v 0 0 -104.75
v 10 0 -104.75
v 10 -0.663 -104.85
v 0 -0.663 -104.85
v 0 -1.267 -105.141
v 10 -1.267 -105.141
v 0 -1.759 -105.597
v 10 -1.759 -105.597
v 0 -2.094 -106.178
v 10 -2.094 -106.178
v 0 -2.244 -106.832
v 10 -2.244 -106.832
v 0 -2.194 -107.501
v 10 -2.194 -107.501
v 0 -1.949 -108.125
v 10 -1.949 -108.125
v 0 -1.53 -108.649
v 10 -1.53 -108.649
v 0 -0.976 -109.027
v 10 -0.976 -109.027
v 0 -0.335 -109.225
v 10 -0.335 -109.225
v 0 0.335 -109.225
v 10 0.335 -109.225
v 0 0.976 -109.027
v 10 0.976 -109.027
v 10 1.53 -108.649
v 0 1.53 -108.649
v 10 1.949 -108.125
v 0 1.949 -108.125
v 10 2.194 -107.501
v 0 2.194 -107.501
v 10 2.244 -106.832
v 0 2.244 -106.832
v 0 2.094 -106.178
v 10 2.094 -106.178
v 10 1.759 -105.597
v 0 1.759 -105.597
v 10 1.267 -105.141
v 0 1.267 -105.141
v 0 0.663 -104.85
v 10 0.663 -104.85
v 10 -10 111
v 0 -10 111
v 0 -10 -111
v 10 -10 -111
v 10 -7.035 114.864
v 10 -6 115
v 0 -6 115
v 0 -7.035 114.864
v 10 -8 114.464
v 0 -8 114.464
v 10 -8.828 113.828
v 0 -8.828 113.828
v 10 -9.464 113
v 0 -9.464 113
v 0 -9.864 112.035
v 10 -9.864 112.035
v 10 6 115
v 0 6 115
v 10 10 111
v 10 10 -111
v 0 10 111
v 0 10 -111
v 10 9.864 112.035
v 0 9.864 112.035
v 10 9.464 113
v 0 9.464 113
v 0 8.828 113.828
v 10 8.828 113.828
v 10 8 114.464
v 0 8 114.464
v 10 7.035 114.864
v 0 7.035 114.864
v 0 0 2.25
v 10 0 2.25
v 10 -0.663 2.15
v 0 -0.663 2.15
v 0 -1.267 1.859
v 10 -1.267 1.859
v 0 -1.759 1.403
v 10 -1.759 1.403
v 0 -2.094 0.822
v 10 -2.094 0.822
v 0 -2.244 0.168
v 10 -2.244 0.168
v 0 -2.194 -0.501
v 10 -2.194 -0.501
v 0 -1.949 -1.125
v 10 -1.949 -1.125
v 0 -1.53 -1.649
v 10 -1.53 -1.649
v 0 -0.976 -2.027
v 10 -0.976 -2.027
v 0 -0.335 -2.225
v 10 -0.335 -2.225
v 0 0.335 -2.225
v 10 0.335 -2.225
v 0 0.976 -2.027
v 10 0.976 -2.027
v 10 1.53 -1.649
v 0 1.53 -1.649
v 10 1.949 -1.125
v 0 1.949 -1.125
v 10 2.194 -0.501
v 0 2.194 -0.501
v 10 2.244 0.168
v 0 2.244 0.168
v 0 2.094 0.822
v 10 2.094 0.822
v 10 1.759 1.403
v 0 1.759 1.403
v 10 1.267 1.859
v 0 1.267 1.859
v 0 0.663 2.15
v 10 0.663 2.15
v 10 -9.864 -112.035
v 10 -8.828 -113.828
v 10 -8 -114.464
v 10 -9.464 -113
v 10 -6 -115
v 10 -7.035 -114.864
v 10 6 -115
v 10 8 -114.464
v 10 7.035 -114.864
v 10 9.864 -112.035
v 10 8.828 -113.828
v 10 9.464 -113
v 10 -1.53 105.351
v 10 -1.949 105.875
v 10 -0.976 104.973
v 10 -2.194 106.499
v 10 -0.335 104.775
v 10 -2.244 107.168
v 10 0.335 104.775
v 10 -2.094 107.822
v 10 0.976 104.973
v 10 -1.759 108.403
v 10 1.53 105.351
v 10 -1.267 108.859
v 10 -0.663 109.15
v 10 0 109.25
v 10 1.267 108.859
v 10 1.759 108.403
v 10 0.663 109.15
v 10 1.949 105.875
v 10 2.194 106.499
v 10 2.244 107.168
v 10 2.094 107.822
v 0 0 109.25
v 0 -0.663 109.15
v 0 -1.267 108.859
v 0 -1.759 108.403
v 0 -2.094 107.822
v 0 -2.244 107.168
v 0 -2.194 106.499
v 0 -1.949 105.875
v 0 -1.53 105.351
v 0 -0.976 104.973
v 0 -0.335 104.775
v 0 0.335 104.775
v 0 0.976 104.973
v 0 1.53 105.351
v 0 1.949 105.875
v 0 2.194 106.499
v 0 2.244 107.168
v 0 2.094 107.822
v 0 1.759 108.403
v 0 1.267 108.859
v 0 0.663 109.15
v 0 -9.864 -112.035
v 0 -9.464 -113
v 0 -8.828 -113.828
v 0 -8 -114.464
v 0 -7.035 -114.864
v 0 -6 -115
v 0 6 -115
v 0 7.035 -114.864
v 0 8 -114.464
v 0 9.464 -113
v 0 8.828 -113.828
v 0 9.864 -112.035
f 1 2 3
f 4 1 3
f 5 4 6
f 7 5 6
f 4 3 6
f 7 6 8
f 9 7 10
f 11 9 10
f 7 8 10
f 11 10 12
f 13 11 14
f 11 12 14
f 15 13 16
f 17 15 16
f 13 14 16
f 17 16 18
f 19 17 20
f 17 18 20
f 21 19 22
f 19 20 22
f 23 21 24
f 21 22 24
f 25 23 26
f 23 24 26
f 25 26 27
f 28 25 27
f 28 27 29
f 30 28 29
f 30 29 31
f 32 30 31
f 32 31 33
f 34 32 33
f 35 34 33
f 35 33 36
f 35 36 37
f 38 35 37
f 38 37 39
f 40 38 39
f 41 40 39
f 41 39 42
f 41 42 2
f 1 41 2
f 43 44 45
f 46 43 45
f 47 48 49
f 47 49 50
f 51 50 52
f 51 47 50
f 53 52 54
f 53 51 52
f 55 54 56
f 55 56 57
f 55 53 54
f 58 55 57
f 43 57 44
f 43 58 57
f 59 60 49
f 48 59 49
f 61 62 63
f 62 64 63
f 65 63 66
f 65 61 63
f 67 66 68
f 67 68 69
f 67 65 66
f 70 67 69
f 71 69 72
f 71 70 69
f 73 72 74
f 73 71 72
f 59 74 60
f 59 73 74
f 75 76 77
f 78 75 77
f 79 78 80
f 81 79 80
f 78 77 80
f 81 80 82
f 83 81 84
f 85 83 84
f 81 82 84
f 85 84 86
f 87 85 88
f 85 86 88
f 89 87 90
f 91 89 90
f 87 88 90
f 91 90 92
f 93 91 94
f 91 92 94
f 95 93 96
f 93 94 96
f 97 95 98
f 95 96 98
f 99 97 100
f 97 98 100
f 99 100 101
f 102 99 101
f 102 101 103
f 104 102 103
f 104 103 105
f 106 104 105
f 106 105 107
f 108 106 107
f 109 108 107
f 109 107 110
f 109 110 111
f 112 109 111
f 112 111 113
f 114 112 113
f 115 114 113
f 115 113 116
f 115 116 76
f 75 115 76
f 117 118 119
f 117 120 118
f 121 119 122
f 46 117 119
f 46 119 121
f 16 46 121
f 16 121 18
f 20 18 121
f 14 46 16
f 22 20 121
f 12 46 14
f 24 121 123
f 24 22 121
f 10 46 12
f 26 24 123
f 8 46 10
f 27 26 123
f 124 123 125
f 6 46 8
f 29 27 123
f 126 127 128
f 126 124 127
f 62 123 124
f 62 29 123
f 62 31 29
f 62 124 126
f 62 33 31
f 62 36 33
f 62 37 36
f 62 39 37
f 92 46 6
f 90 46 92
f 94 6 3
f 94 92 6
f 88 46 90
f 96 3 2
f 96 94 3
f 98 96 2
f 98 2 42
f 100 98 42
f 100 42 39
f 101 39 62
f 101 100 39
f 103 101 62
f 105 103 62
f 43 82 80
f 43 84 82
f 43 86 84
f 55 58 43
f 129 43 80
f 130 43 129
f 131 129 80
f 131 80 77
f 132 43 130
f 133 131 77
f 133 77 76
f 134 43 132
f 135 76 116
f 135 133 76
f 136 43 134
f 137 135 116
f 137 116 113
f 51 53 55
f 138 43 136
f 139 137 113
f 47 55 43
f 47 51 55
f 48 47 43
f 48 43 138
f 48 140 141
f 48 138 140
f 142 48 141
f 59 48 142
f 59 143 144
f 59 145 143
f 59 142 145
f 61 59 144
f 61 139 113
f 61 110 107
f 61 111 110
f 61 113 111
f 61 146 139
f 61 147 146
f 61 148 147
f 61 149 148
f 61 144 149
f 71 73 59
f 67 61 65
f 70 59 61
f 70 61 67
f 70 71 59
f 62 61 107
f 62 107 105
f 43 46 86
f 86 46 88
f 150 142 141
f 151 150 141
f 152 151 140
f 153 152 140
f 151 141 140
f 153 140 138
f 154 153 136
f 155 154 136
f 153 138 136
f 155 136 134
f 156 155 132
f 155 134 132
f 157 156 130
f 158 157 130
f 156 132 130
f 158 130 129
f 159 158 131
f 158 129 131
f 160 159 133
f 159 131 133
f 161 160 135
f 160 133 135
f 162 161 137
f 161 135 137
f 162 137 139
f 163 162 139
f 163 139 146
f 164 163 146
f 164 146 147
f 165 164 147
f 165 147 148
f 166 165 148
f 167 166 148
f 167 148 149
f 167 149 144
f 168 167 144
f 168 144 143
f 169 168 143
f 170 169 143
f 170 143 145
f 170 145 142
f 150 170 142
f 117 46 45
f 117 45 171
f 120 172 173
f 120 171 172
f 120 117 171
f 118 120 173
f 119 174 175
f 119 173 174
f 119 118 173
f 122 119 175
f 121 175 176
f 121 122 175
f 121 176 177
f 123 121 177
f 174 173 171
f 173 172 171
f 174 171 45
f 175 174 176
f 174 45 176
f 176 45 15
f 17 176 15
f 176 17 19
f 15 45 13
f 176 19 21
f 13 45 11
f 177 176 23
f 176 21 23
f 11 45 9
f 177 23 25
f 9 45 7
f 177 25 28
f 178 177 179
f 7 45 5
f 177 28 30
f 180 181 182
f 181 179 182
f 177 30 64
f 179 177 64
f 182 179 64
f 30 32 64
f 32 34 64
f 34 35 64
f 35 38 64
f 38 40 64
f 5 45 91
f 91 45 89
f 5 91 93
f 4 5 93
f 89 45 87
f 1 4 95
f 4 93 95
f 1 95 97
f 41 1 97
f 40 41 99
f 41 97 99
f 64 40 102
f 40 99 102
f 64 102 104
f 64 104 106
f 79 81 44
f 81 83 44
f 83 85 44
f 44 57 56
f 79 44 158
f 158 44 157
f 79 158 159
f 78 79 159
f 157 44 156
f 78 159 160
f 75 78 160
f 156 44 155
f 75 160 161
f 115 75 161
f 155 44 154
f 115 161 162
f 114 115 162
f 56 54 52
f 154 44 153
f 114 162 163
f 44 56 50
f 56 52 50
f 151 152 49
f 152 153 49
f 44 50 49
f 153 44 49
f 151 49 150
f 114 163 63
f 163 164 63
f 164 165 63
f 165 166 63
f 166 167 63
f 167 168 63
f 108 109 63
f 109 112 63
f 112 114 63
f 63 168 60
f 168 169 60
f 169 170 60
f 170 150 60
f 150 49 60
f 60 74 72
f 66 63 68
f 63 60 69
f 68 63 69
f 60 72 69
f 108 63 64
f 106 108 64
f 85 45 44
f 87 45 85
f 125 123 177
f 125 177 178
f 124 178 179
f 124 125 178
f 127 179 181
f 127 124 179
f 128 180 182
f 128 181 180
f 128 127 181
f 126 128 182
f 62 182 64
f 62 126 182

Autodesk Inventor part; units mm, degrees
ref_plane "YZ Plane" through (0, 0, 0) normal (1, 0, 0) x (0, 1, 0)
ref_plane "XZ Plane" through (0, 0, 0) normal (0, 1, 0) x (-1, 0, 0)
ref_plane "XY Plane" through (0, 0, 0) normal (0, 0, 1) x (1, 0, 0)
sketch "Skizze1" plane through (0, 0, 0) normal (1, 0, 0) x (0, 1, 0)
  line L0 (10, 115) -> (-10, 115)
  line L1 (-10, 115) -> (-10, -115)
  line L2 (-10, -115) -> (10, -115)
  line L3 (10, -115) -> (10, 115)
  line L4 (10, 115) -> (-10, -115) construction
  line L5 (-10, 115) -> (10, -115) construction
  point P0 (0, 0)
  dimension "d0" = 230
  dimension "d1" = 20
extrude "Extrusion1" add sketch "Skizze1" along normal blind 10
sketch "Skizze2" plane through (0, 0, 0) normal (-1, 0, 0) x (0, 0, 1)
  line L0 (-115, -10) -> (-115, 10) projected
  point P0 (0, 0)
  point P1 (-107, 0)
  point P2 (0, 0)
  point P3 (107, 0)
  dimension "d4" = 8
  dimension "d5" = 107
  dimension "d13" = 107
hole "Bohrung1" at (0, 0, -107) at (0, 0, 0) at (0, 0, 107) direction (1, 0, 0) diameter 4.5 end through all
fillet "Rundung1" radius 4 4 edges at (5, 10, -115) (5, -10, -115) (5, -10, 115) (5, 10, 115)
properties part number "103.018.01_Distanz_Wand"
